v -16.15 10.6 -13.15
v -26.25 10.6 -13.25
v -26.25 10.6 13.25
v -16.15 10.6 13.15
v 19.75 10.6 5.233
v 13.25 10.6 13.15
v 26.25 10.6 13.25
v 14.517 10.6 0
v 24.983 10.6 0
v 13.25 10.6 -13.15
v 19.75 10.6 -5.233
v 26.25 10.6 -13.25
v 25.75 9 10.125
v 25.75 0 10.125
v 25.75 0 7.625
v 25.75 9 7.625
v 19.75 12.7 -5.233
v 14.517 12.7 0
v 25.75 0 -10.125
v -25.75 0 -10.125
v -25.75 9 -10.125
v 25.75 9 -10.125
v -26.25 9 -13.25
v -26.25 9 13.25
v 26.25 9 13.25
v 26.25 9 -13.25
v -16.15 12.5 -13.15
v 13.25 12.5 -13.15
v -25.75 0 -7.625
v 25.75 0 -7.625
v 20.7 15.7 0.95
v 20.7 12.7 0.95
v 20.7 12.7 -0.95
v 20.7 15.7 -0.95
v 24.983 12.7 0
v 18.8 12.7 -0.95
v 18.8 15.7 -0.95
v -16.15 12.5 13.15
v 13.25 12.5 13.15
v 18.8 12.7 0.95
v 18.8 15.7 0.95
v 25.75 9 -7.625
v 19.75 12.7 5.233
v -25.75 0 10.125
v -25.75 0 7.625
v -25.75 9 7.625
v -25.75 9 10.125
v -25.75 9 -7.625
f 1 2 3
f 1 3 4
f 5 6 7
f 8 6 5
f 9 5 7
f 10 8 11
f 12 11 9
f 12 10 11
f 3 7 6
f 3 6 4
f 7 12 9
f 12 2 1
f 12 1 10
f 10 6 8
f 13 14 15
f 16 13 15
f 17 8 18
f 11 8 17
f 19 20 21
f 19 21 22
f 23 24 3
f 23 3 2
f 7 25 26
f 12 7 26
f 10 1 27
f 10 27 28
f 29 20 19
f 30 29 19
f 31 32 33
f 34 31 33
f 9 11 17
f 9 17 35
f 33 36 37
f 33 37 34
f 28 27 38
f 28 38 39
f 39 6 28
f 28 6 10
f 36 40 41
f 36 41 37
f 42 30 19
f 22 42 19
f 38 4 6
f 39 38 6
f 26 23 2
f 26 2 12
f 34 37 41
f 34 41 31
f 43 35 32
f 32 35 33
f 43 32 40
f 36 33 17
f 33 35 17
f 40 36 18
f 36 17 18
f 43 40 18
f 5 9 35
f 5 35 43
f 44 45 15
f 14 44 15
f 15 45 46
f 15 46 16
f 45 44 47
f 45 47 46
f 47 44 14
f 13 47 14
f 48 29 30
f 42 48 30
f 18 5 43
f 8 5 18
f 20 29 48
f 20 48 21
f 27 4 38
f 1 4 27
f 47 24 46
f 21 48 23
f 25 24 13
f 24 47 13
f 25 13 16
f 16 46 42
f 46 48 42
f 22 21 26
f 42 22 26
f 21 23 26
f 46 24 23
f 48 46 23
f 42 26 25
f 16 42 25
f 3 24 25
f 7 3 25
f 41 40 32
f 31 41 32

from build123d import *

# Parameters (mm, degrees)
SKETCH1_W             = 51.5
SKETCH1_H             = 2.5
BOSS_EXTRUDE1_DEPTH   = 9
BOSS_EXTRUDE1_2_DEPTH = 9
SKETCH2_W             = 52.5
SKETCH2_H             = 26.5
BOSS_EXTRUDE2_DEPTH   = 1.6
SKETCH3_W             = 29.4
SKETCH3_H             = 26.3
BOSS_EXTRUDE3_DEPTH   = 1.9
BOSS_EXTRUDE4_DEPTH   = 2.1
SKETCH5_W             = 1.9
SKETCH5_H             = 1.9
BOSS_EXTRUDE5_DEPTH   = 3


with BuildPart() as part:
    # Sketch1 → Boss-Extrude1 (new body)
    with BuildSketch(Plane(origin=(0, 0, 0), x_dir=(1, 0, 0), z_dir=(0, 1, 0))):
        with Locations((0, 8.875)):
            Rectangle(SKETCH1_W, SKETCH1_H)
    extrude(amount=BOSS_EXTRUDE1_DEPTH)



with BuildPart() as body_2:
    # Sketch1 → Boss-Extrude1 2 (new body)
    with BuildSketch(Plane(origin=(0, 0, 0), x_dir=(1, 0, 0), z_dir=(0, 1, 0))):
        with Locations((0, -8.875)):
            Rectangle(SKETCH1_W, SKETCH1_H)
    extrude(amount=BOSS_EXTRUDE1_2_DEPTH)


with BuildPart() as part_1:
    add(part.part)

    add(body_2.part)  # Boss-Extrude2 merges body 2
    # Sketch2 → Boss-Extrude2 (add)
    with BuildSketch(Plane(origin=(0, 9, 0), x_dir=(1, 0, 0), z_dir=(0, 1, 0))):
        Rectangle(SKETCH2_W, SKETCH2_H)
    extrude(amount=BOSS_EXTRUDE2_DEPTH)

    # Sketch3 → Boss-Extrude3 (add)
    with BuildSketch(Plane(origin=(0, 10.6, 0), x_dir=(1, 0, 0), z_dir=(0, 1, 0))):
        with Locations((-1.45, 0)):
            Rectangle(SKETCH3_W, SKETCH3_H)
    extrude(amount=BOSS_EXTRUDE3_DEPTH)

    # Sketch4 → Boss-Extrude4 (add)
    with BuildSketch(Plane(origin=(0, 10.6, 0), x_dir=(1, 0, 0), z_dir=(0, 1, 0))):
        Polygon((24.982590181, 0), (19.75, -5.232590181), (14.517409819, 0), (19.75, 5.232590181), align=None)
    extrude(amount=BOSS_EXTRUDE4_DEPTH)

    # Sketch5 → Boss-Extrude5 (add)
    with BuildSketch(Plane(origin=(0, 12.7, 0), x_dir=(1, 0, 0), z_dir=(0, 1, 0))):
        with Locations((19.75, 0)):
            Rectangle(SKETCH5_W, SKETCH5_H)
    extrude(amount=BOSS_EXTRUDE5_DEPTH)


solid = part_1.part
